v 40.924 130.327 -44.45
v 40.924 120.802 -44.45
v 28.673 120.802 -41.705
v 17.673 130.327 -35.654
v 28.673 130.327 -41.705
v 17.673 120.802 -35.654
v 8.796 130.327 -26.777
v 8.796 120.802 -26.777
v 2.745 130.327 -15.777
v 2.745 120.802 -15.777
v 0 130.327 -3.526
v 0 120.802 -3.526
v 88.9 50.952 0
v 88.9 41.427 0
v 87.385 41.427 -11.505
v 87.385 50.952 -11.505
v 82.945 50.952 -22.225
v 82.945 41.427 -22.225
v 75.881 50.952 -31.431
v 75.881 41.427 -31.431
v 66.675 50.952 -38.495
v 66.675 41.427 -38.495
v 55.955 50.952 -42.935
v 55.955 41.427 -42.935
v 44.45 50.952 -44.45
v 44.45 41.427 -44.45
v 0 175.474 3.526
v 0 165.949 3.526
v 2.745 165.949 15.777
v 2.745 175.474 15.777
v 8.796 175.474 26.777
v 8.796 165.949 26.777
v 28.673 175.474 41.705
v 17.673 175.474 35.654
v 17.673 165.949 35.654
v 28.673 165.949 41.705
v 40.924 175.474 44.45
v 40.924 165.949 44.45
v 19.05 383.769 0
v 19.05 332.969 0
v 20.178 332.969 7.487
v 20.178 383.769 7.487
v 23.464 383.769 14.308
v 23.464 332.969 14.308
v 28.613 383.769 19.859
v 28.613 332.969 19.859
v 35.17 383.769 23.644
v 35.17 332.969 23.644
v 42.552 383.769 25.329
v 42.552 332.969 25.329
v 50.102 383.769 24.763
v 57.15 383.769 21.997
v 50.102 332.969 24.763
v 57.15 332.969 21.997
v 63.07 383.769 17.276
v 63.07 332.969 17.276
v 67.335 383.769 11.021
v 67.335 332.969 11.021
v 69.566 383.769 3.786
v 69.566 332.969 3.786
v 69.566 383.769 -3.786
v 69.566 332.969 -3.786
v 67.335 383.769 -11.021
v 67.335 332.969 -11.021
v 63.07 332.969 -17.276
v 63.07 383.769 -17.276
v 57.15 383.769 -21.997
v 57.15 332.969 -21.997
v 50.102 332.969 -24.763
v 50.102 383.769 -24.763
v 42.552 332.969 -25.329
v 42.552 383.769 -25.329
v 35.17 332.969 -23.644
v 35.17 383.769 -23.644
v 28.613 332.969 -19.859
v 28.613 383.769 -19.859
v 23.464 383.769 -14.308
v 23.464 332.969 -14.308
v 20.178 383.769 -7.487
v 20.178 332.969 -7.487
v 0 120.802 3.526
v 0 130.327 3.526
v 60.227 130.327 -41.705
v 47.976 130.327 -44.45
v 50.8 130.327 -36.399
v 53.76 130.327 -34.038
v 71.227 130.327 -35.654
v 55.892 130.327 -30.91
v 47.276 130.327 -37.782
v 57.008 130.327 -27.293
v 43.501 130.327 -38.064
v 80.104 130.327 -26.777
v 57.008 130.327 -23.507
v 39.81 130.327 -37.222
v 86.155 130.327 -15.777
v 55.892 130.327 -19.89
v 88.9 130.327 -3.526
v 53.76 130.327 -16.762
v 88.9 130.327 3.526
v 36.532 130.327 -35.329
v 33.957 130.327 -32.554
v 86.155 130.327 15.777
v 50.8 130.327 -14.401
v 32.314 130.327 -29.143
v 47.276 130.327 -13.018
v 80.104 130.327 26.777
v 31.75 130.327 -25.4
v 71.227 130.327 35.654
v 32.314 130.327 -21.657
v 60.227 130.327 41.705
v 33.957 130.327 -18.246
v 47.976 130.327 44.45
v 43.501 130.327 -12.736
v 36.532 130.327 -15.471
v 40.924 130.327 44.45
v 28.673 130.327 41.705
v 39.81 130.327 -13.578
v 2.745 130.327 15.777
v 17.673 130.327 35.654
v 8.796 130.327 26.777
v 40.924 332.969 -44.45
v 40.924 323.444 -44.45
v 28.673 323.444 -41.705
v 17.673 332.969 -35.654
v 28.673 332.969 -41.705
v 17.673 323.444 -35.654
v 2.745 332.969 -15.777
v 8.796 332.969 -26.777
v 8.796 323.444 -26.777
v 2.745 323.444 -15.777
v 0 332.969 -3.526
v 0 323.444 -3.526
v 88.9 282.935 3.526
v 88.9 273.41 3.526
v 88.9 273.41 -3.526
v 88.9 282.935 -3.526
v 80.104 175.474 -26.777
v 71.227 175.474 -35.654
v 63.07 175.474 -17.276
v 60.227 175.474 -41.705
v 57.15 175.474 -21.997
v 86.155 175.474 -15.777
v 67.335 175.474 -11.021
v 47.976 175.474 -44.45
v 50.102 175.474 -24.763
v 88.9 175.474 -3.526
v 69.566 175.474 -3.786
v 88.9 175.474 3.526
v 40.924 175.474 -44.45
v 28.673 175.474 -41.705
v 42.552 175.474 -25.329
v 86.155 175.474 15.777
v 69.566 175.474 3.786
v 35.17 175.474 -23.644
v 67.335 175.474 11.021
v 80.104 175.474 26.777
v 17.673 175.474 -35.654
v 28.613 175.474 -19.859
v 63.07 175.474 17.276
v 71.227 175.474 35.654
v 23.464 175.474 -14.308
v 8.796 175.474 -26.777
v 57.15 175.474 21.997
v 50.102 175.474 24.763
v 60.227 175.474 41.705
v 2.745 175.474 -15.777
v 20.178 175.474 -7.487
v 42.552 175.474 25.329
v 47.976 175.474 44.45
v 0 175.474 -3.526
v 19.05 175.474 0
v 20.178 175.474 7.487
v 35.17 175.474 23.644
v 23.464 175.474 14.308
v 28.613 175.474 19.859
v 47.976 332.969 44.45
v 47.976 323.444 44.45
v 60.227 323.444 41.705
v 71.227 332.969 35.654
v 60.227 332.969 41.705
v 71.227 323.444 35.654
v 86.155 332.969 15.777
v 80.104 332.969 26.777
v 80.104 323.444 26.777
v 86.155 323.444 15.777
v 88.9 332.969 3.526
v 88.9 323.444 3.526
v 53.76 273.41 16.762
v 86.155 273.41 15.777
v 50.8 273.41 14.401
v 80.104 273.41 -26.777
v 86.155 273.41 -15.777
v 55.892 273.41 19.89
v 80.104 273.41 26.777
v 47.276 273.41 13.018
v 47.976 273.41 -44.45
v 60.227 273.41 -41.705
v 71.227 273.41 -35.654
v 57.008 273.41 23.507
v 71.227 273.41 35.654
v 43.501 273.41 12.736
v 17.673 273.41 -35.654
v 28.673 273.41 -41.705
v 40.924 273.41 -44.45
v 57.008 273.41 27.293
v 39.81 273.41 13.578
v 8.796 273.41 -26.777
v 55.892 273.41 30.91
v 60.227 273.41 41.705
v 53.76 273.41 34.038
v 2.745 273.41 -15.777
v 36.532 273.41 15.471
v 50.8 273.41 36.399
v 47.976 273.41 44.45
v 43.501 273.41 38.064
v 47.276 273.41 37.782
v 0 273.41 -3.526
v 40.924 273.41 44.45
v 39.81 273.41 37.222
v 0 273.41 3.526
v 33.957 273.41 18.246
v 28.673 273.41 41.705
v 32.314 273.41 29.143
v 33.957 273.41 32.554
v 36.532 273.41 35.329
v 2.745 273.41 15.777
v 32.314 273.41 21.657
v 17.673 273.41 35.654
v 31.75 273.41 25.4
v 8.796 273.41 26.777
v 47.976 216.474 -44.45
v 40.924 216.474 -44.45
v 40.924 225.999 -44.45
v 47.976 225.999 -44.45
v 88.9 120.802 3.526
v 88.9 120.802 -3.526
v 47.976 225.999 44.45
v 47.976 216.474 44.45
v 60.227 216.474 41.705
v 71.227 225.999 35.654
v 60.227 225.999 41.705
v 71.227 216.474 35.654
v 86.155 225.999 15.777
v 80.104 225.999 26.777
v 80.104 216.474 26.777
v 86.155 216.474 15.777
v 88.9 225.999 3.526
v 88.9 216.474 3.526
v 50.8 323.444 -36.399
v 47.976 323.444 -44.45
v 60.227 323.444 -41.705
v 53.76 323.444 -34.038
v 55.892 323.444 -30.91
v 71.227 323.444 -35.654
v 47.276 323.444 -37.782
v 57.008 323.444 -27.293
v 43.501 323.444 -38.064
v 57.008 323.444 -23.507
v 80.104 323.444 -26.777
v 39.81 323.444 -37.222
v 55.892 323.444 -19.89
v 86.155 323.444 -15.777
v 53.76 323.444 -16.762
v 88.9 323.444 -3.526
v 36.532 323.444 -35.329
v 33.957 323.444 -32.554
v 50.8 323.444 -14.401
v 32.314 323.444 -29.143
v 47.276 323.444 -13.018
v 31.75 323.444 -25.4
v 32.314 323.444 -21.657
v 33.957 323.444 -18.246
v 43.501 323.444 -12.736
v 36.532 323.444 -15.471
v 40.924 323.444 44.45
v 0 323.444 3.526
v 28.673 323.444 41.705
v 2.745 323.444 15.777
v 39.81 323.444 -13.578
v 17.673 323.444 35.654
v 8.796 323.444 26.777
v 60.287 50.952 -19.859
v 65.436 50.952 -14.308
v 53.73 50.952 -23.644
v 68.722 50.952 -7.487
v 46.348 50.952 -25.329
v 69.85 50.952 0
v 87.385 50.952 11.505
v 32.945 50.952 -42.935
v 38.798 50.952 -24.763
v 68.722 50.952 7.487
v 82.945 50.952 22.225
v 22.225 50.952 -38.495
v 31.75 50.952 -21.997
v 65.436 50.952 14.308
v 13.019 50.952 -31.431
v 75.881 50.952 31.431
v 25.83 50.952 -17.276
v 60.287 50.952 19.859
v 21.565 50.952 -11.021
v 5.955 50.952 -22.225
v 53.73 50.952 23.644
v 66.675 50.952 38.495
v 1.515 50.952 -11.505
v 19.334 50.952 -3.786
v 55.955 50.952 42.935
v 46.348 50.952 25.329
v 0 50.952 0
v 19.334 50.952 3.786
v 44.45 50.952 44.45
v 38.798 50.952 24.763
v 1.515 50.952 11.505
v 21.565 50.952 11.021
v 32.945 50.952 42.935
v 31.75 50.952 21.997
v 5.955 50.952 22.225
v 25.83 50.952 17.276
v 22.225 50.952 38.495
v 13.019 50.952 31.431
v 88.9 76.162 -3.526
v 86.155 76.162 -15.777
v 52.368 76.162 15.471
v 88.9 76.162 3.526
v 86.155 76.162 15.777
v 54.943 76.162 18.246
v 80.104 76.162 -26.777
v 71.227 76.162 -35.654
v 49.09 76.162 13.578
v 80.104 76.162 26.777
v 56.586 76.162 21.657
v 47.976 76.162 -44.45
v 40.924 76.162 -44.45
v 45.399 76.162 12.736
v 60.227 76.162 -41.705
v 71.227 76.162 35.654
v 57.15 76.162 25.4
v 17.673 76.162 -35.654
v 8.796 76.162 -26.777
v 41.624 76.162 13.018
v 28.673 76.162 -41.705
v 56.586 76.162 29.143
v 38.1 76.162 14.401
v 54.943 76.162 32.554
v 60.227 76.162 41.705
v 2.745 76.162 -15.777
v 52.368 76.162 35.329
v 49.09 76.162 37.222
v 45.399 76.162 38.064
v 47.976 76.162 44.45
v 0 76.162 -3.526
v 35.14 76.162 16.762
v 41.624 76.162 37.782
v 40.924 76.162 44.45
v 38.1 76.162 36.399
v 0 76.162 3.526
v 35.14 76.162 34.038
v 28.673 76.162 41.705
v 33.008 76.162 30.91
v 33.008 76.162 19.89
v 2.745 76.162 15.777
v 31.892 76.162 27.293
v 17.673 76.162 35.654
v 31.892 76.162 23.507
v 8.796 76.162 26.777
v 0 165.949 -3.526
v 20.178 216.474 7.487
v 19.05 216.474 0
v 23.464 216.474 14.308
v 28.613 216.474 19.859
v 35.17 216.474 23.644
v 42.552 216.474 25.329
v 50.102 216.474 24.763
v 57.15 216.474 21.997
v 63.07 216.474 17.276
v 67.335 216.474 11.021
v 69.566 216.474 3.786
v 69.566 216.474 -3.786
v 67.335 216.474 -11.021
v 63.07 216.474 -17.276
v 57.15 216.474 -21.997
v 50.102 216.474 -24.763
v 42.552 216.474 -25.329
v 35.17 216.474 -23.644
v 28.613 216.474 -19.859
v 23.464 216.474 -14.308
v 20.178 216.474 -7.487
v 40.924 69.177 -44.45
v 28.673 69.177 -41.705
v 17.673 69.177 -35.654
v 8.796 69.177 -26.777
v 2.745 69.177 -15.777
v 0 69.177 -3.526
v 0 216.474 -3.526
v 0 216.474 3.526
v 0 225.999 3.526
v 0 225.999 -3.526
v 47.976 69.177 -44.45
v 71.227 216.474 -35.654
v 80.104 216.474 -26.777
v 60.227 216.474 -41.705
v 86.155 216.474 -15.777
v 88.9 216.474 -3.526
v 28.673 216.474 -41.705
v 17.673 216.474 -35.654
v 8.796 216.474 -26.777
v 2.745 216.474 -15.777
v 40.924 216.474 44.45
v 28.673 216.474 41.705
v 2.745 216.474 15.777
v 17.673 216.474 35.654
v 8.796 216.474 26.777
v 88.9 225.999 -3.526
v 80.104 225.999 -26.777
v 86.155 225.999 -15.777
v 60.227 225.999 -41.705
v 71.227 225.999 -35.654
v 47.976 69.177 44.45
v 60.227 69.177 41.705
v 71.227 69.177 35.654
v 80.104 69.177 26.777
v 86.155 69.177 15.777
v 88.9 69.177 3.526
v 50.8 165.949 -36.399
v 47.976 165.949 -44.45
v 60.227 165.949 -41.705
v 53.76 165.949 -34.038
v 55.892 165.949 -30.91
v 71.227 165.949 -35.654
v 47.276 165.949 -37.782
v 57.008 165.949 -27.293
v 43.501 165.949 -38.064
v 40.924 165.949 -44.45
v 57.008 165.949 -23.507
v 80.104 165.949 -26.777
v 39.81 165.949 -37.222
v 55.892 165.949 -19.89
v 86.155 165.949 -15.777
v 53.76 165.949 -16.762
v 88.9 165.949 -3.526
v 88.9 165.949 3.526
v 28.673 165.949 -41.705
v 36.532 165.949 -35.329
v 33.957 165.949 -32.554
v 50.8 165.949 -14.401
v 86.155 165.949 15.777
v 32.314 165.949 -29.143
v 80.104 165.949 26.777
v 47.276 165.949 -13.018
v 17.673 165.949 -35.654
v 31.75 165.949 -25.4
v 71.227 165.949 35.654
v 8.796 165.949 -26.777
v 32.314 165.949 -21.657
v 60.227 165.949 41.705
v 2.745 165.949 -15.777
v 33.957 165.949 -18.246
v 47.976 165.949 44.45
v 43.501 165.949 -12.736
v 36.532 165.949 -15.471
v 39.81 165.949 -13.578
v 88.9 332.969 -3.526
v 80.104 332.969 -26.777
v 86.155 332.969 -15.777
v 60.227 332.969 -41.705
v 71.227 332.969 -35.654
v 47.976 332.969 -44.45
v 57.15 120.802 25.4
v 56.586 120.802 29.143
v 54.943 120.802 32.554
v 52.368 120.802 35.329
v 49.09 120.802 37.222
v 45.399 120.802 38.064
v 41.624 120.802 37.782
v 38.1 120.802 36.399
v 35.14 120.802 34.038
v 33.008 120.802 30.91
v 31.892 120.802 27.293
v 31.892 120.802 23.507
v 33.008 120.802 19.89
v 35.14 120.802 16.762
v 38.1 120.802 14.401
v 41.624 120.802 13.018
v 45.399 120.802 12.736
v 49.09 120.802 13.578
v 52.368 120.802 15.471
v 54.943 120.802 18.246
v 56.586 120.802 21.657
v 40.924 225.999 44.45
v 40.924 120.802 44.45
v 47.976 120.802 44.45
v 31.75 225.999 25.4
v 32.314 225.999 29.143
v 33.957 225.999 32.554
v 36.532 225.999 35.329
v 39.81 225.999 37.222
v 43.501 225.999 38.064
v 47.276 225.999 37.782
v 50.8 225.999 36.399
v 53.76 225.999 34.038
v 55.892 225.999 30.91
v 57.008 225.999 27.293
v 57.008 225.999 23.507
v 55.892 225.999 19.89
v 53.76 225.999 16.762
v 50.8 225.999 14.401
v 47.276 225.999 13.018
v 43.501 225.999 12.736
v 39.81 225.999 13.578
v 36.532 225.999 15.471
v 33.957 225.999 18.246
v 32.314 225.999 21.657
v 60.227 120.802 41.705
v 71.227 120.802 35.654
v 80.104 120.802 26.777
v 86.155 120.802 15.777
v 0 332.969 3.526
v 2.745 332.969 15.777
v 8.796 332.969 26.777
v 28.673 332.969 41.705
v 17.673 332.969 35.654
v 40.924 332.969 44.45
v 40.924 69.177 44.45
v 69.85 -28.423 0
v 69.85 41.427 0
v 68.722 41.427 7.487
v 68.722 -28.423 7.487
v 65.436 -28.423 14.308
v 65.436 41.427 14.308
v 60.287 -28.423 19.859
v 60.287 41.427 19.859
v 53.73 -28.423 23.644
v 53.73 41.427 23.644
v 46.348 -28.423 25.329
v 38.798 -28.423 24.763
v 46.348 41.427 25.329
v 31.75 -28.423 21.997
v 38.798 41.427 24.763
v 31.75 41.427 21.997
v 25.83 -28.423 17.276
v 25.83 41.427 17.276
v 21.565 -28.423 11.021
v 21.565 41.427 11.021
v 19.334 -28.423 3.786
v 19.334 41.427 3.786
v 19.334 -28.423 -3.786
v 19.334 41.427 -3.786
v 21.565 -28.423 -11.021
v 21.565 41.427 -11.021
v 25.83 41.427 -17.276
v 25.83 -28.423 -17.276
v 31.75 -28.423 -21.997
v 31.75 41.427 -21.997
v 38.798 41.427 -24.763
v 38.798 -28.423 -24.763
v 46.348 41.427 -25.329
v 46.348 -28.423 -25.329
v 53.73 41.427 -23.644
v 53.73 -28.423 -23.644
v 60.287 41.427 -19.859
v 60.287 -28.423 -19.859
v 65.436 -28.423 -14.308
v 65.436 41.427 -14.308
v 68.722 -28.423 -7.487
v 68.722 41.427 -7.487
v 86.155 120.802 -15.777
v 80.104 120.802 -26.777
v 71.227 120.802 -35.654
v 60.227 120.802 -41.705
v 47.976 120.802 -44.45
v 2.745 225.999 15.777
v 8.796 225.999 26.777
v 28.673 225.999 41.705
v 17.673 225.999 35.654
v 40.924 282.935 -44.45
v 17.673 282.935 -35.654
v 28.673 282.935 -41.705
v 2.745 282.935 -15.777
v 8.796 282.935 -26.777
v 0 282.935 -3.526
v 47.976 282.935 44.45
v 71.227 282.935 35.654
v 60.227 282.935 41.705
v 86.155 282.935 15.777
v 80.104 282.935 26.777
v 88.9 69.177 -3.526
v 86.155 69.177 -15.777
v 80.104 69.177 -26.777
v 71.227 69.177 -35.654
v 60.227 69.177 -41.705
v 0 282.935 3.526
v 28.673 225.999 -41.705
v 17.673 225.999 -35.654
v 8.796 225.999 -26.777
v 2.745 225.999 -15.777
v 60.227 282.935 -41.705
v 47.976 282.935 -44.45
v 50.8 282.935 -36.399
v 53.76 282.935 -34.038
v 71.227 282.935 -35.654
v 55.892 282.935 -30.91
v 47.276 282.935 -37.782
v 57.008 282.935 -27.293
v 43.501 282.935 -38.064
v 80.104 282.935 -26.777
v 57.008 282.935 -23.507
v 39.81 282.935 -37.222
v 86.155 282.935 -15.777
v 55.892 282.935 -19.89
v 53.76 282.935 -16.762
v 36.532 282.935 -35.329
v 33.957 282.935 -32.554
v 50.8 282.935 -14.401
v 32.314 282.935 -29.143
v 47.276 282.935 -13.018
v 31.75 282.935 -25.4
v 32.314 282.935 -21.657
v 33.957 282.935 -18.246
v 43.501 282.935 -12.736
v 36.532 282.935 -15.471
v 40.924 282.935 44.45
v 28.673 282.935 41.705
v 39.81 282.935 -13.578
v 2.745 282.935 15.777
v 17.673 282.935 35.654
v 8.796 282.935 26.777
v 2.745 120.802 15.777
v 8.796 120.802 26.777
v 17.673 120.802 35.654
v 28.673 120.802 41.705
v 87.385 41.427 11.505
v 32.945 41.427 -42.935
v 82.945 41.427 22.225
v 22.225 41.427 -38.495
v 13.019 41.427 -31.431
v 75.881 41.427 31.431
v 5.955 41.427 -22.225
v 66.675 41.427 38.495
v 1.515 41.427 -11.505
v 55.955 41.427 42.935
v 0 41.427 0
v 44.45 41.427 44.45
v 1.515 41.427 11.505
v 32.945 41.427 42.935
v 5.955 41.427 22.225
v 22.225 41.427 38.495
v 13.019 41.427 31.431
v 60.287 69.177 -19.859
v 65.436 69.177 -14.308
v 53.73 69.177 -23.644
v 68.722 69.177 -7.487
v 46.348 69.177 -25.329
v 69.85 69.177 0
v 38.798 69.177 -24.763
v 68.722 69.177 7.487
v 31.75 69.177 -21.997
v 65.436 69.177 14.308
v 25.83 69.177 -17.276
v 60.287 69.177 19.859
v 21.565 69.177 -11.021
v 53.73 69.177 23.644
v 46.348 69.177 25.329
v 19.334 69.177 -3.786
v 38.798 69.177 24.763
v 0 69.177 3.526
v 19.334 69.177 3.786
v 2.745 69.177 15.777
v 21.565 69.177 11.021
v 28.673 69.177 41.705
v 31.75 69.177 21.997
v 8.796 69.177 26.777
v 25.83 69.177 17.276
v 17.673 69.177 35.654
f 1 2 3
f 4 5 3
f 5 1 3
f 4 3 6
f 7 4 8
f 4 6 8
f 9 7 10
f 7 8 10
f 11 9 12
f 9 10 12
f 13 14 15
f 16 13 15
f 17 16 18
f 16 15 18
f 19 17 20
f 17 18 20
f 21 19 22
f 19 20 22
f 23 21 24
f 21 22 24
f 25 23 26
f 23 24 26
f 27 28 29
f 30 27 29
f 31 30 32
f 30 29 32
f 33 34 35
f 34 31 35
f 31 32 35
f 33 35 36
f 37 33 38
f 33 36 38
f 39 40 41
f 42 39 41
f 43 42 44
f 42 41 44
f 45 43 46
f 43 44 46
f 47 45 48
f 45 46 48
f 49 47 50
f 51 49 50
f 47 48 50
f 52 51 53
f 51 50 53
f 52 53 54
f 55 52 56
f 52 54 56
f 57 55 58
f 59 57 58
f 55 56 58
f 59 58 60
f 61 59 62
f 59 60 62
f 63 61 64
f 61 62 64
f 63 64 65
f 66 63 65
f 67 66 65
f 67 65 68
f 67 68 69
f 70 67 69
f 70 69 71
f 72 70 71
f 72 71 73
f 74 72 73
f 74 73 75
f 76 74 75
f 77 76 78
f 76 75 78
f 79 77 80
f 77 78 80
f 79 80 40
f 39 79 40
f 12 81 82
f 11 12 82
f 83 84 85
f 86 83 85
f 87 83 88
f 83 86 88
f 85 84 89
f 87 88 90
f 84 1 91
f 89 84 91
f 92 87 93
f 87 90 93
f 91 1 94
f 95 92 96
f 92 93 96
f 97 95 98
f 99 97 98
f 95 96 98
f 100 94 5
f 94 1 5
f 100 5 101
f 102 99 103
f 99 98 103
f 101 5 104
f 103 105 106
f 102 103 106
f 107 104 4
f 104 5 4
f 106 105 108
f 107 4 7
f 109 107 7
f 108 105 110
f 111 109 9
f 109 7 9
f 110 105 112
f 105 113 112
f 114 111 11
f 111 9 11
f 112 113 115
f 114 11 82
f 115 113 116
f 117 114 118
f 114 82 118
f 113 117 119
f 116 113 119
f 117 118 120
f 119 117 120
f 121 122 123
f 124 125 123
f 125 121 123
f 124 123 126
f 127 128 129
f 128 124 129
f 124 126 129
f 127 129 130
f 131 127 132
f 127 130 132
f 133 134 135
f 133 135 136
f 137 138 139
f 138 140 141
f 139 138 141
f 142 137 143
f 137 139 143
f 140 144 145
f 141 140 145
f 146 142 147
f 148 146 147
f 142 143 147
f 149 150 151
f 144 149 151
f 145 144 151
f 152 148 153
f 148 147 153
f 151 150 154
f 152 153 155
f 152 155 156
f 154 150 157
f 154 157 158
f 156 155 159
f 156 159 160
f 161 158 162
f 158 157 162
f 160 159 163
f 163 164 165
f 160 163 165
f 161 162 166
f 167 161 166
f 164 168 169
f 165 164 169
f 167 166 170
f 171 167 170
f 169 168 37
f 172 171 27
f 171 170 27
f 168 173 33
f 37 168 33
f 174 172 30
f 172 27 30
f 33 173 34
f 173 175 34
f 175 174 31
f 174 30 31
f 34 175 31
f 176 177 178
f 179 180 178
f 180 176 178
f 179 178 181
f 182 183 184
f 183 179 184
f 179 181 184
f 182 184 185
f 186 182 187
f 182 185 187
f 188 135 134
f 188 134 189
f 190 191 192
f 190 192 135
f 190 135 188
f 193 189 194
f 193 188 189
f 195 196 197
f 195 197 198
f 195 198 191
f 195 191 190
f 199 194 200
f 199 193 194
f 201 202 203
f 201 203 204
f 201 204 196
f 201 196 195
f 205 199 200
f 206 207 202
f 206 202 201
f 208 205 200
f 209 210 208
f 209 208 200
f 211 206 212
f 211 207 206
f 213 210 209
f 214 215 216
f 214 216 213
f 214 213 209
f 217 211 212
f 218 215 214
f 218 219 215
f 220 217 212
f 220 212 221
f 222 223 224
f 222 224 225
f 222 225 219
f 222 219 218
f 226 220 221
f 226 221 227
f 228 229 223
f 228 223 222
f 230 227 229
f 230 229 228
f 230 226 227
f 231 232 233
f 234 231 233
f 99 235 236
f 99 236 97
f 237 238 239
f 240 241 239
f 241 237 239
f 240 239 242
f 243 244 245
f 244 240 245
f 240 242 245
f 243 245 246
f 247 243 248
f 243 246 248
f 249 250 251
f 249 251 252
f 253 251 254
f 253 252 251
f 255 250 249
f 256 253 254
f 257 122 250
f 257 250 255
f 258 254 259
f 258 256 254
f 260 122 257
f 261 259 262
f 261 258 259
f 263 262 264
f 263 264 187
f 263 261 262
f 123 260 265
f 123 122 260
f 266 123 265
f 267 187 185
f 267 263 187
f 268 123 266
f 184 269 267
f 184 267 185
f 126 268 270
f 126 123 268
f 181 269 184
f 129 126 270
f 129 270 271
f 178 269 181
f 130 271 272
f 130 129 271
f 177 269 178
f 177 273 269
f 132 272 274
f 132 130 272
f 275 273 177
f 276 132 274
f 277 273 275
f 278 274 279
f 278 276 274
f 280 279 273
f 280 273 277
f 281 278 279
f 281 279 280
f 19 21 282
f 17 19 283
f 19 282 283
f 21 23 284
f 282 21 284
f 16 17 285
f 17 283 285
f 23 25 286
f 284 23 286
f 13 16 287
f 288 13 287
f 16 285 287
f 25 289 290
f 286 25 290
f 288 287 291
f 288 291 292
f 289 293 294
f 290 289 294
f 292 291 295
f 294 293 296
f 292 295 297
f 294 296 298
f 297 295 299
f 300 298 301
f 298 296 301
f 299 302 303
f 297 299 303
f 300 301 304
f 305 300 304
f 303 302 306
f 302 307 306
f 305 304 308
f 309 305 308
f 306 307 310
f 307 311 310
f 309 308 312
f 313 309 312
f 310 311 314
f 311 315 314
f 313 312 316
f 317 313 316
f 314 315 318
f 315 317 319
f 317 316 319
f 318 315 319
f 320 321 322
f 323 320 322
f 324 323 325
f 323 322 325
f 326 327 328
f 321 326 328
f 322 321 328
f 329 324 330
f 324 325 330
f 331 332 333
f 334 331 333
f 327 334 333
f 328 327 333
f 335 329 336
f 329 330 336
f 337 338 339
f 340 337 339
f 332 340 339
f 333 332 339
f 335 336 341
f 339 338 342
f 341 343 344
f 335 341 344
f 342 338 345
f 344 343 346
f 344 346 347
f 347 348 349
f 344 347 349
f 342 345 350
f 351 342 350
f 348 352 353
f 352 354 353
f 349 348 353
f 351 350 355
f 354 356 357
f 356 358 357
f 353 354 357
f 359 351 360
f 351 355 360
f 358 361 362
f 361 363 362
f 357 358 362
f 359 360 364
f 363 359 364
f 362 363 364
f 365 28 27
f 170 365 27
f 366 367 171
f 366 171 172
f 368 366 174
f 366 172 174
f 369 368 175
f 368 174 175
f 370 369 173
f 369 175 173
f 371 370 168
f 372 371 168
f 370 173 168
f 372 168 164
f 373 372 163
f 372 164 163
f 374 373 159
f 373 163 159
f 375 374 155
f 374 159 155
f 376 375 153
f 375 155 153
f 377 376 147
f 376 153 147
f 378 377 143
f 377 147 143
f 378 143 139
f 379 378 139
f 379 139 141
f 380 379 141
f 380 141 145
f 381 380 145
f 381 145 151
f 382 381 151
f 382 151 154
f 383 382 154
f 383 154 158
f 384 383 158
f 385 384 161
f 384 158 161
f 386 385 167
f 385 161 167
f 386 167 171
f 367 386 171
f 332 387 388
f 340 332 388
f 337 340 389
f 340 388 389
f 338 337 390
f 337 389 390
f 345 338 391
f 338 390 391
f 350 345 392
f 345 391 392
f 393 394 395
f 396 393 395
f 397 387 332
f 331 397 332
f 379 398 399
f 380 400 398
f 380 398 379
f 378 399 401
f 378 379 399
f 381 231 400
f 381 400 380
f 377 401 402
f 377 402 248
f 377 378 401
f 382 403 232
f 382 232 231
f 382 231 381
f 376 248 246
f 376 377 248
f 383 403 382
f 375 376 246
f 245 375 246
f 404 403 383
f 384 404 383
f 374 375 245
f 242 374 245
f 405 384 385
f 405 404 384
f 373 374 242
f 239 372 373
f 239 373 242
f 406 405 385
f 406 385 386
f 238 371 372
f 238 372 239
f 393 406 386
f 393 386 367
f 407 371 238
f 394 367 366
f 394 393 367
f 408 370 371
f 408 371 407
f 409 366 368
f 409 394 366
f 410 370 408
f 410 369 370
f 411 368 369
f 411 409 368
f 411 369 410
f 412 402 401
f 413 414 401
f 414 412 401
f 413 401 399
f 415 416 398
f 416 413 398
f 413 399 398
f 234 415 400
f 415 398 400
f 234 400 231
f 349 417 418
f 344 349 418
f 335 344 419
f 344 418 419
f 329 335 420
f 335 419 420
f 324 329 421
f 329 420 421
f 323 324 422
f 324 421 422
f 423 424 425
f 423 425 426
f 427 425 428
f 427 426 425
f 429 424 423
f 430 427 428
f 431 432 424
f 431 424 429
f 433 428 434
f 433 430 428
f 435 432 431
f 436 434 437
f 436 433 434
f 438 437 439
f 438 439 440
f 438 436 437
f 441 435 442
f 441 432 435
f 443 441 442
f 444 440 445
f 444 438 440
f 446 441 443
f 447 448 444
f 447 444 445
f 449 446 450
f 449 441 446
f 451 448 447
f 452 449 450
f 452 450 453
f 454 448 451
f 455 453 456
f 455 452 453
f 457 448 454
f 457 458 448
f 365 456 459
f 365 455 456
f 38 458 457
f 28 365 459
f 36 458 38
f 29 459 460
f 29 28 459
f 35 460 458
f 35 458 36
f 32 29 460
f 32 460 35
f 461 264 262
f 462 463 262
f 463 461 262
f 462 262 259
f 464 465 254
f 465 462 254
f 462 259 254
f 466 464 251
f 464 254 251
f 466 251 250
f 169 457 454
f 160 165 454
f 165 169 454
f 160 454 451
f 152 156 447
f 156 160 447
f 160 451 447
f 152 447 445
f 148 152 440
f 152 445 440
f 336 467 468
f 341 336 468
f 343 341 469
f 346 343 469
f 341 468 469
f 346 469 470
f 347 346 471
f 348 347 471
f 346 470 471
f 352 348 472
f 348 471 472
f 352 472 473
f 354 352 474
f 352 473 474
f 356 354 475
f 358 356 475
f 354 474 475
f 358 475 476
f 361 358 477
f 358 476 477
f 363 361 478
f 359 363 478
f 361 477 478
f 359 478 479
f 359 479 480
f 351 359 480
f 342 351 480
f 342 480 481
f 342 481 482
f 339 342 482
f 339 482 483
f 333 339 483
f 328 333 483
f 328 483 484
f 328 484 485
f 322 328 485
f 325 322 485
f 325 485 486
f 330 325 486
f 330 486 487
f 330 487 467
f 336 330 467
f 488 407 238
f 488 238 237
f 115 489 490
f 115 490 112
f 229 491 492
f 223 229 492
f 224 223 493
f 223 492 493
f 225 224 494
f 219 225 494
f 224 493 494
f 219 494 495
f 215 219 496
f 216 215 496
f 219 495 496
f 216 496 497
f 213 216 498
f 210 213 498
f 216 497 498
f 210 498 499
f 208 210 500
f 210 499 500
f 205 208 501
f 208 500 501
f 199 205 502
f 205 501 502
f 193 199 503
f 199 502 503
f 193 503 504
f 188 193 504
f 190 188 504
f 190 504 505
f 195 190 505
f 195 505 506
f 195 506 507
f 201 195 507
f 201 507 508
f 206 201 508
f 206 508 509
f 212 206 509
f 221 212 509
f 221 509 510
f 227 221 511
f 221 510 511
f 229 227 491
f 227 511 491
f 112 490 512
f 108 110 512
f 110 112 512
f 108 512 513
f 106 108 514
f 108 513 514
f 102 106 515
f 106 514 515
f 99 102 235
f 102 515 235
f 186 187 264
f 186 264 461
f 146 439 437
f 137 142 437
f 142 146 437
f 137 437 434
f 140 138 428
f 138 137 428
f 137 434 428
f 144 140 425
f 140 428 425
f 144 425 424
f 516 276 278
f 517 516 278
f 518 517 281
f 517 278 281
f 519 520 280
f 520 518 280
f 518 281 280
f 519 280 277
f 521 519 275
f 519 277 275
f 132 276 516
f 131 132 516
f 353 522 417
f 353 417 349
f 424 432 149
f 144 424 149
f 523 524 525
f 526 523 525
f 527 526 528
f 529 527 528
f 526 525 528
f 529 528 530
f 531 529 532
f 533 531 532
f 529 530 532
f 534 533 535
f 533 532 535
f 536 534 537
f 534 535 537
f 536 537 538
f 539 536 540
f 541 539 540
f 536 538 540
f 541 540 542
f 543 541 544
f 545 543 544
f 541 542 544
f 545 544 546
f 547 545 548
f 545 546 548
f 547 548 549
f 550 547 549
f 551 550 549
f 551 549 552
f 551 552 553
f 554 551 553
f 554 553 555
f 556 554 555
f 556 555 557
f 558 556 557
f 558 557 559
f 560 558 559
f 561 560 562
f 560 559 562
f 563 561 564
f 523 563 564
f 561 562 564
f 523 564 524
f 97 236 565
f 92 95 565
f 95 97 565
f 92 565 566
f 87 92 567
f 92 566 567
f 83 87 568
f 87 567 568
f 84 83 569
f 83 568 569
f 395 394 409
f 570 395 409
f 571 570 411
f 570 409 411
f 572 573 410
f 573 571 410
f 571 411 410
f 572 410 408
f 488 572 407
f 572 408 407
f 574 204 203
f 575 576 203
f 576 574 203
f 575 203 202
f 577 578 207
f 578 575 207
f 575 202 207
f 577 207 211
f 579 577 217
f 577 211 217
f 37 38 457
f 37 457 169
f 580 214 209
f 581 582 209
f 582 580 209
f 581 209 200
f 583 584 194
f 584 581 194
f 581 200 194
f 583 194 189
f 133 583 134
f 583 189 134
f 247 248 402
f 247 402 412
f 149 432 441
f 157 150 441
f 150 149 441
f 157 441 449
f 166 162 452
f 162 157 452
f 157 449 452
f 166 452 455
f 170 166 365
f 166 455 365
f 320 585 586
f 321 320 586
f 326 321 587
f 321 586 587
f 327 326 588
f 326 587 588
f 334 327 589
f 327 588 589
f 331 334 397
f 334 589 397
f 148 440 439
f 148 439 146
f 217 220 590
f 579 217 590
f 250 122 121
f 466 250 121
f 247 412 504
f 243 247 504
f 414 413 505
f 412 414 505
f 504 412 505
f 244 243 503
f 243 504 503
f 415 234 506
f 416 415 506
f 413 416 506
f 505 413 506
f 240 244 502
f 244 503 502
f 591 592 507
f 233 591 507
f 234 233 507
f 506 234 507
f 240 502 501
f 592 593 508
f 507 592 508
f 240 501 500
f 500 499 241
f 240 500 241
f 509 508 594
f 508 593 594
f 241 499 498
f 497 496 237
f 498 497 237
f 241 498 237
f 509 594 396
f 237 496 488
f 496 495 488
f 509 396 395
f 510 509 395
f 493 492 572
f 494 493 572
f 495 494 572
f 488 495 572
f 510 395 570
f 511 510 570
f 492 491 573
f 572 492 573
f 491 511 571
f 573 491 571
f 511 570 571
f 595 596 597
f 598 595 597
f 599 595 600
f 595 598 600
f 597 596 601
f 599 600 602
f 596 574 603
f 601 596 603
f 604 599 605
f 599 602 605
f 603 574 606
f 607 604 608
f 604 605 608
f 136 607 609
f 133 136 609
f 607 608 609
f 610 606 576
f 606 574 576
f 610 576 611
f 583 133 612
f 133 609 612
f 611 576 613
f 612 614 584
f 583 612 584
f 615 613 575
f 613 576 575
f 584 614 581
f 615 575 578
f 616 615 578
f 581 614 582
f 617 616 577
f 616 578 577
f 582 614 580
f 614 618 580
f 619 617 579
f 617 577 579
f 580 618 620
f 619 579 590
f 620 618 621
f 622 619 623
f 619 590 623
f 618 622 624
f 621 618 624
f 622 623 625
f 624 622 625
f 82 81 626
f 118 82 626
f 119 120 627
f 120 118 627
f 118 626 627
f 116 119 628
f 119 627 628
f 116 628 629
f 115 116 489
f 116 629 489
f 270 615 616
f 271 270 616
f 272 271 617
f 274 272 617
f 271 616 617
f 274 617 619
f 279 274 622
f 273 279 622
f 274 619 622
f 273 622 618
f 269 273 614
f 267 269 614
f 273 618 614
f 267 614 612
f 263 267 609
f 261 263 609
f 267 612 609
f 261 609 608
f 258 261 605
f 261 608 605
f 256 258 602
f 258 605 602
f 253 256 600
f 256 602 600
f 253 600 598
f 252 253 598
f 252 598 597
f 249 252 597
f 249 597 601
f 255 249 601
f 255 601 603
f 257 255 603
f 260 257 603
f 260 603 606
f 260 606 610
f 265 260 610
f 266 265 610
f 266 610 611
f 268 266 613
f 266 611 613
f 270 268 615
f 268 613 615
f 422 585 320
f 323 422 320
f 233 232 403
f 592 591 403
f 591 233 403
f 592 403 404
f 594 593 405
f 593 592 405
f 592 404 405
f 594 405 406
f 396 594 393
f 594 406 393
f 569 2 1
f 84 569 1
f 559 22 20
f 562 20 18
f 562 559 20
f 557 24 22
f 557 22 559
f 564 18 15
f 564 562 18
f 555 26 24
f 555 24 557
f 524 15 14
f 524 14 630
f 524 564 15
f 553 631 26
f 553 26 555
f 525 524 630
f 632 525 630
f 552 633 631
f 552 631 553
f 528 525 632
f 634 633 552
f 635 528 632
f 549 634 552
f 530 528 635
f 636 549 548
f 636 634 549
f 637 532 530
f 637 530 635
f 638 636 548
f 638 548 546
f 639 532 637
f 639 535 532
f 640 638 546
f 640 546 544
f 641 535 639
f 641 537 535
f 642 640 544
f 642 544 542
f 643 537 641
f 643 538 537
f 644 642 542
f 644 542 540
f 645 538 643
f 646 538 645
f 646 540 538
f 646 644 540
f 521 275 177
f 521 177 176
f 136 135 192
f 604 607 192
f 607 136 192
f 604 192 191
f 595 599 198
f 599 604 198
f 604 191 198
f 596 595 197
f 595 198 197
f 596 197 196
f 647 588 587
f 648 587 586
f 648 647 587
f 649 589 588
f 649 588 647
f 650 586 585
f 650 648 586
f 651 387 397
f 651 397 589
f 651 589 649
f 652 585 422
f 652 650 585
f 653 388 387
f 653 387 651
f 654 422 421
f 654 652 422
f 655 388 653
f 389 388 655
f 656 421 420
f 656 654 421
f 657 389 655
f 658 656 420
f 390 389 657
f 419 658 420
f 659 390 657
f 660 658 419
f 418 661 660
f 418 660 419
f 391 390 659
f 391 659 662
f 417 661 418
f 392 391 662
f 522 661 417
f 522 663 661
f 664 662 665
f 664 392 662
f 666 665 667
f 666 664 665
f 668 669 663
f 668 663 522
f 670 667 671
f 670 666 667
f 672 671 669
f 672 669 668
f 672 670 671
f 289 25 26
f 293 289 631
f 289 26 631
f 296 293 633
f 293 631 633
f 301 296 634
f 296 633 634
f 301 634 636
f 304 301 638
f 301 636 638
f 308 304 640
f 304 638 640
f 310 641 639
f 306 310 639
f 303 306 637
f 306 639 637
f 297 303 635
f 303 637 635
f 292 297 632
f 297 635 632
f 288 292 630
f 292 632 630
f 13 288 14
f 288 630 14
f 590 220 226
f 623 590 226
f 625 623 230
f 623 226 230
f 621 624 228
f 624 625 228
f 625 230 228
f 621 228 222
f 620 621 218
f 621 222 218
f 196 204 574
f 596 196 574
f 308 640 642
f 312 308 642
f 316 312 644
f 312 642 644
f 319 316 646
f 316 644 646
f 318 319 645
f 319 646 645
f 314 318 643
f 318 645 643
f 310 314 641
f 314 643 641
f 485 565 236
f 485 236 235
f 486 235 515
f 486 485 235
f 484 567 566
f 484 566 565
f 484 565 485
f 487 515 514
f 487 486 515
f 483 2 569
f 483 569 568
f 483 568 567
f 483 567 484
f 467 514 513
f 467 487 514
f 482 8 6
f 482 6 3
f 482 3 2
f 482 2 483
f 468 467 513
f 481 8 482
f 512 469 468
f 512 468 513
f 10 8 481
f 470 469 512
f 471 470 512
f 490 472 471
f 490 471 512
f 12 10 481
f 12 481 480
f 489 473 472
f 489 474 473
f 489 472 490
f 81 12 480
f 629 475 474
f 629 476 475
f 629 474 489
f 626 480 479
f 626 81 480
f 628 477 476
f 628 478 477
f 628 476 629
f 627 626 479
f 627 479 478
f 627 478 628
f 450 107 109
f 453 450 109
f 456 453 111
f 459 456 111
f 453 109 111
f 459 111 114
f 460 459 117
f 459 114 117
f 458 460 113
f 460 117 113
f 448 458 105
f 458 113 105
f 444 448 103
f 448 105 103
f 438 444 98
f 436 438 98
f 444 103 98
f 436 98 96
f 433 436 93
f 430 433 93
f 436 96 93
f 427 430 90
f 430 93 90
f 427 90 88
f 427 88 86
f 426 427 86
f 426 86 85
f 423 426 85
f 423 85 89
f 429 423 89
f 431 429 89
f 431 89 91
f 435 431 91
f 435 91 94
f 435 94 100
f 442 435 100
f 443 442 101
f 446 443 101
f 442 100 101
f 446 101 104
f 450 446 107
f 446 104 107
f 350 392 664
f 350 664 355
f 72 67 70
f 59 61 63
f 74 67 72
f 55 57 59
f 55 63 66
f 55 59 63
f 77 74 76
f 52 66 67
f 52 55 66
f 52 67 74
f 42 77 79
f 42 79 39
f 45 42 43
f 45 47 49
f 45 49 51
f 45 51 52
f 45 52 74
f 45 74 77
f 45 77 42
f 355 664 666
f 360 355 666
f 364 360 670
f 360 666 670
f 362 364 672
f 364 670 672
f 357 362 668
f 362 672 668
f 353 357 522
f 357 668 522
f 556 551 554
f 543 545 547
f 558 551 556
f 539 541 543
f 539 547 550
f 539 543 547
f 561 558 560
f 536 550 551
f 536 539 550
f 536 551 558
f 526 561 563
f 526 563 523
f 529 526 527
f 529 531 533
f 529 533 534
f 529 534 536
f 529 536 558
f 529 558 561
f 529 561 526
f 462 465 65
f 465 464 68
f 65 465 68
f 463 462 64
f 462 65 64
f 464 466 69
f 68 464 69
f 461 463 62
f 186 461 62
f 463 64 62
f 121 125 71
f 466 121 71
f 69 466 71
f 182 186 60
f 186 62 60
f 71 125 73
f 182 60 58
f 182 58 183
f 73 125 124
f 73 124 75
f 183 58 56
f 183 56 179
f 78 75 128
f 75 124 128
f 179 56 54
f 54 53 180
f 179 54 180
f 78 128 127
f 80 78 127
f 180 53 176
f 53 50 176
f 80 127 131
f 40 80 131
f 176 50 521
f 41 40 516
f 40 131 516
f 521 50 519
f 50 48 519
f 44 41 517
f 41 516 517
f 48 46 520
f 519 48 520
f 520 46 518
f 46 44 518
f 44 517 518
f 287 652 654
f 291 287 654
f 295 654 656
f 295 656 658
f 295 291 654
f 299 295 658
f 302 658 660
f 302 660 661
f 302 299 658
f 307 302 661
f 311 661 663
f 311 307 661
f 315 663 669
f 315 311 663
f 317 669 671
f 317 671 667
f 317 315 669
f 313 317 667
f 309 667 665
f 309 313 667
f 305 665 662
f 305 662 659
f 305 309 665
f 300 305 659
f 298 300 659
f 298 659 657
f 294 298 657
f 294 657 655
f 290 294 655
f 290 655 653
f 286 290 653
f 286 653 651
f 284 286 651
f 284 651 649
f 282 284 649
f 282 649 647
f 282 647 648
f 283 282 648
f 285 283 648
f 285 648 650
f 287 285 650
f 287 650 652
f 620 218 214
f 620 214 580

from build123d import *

# Parameters (mm, degrees)
F0_W          = 9.525
F0_H          = 88.9
F1_DEPTH      = 88.9
F2_R          = 25.4
F3_DEPTH      = 69.85
F3_DEPTH_BACK = 30.734
F4_DEPTH      = 12.192
F5_R          = 12.7
F6_DEPTH      = 42.1005
F7_R          = 12.7
F8_DEPTH      = 35.6218531678
F9_R          = 25.4
F10_DEPTH     = 40.9996094773
F11_R         = 12.7
F12_DEPTH     = 47.4110707312
F13_R         = 12.7
F14_DEPTH     = 40.5094634056
F16_DEPTH     = 263.7934967819
F17_R         = 25.4
F18_DEPTH     = 50.8
F19_DEPTH     = 2.54


with BuildPart() as f1:
    # F0 (on Right) → F1 (new body)
    with BuildSketch(Plane.YZ):
        with Locations((46.1899, 0)):
            Rectangle(F0_W, F0_H)
    extrude(amount=F1_DEPTH)



with BuildPart() as f1b:
    # F0 (on Right) → F1, piece 2 (new body)
    with BuildSketch(Plane.YZ):
        with Locations((73.9394, 0)):
            Rectangle(F0_W, F0_H)
    extrude(amount=F1_DEPTH)


with BuildPart() as f1c:
    # F0 (on Right) → F1, piece 3 (new body)
    with BuildSketch(Plane.YZ):
        with Locations((125.5649, 0)):
            Rectangle(F0_W, F0_H)
    extrude(amount=F1_DEPTH)


with BuildPart() as f1d:
    # F0 (on Right) → F1, piece 4 (new body)
    with BuildSketch(Plane.YZ):
        with Locations((170.7117531678, 0)):
            Rectangle(F0_W, F0_H)
    extrude(amount=F1_DEPTH)


with BuildPart() as f1e:
    # F0 (on Right) → F1, piece 5 (new body)
    with BuildSketch(Plane.YZ):
        with Locations((221.2363626451, 0)):
            Rectangle(F0_W, F0_H)
    extrude(amount=F1_DEPTH)


with BuildPart() as f1f:
    # F0 (on Right) → F1, piece 6 (new body)
    with BuildSketch(Plane.YZ):
        with Locations((278.1724333763, 0)):
            Rectangle(F0_W, F0_H)
    extrude(amount=F1_DEPTH)


with BuildPart() as f1g:
    # F0 (on Right) → F1, piece 7 (new body)
    with BuildSketch(Plane.YZ):
        with Locations((328.2068967819, 0)):
            Rectangle(F0_W, F0_H)
    extrude(amount=F1_DEPTH)


with BuildPart() as f1_1:
    add(f1.part)

    add(f1b.part)  # F3 merges F1b
    # F2 (on face) → F3 (join, two sides)
    with BuildSketch(Plane.XZ.offset(-41.4274)) as f3_sk:
        with Locations((44.45, 0)):
            Circle(F2_R)
    extrude(amount=F3_DEPTH)
    extrude(f3_sk.sketch, amount=-F3_DEPTH_BACK)

    # F2 (on face) → F4 (cut)
    with BuildSketch(Plane.XZ.offset(-41.4274)):
        with BuildLine():
            ThreePointArc((44.45, 44.45), (75.8808964237, 31.4308964237), (88.9, 0))
            Line((88.9, 0), (88.9, 44.45))
            Line((88.9, 44.45), (44.45, 44.45))
        make_face()
        with BuildLine():
            ThreePointArc((0, -1.192e-07), (13.0191035341, 31.4308963816), (44.45, 44.45))
            Line((44.45, 44.45), (0, 44.45))
            Line((0, 44.45), (0, -1.192e-07))
        make_face()
        with BuildLine():
            Line((0, -44.45), (44.45, -44.45))
            ThreePointArc((44.45, -44.45), (13.0191036184, -31.4308964659), (0, -1.192e-07))
            Line((0, -1.192e-07), (0, -44.45))
        make_face()
        with BuildLine():
            Line((88.9, -44.45), (88.9, 0))
            ThreePointArc((88.9, 0), (75.8808964237, -31.4308964237), (44.45, -44.45))
            Line((44.45, -44.45), (88.9, -44.45))
        make_face()
    extrude(amount=-F4_DEPTH, mode=Mode.SUBTRACT)


    add(f1c.part)  # F6 merges F1c
    # F5 (on face) → F6 (join, through all)
    with BuildSketch(Plane.XZ.offset(-120.8024)):
        with Locations((44.45, 25.4)):
            Circle(F5_R)
    extrude(amount=F6_DEPTH)


    add(f1d.part)  # F8 merges F1d
    # F7 (on face) → F8 (join, through all)
    with BuildSketch(Plane(origin=(0, 130.3274, 0), x_dir=(-1, 0, 0), z_dir=(0, 1, 0))):
        with Locations((-44.45, -25.4)):
            Circle(F7_R)
    extrude(amount=F8_DEPTH)


    add(f1e.part)  # F10 merges F1e
    # F9 (on face) → F10 (join, through all)
    with BuildSketch(Plane(origin=(0, 175.4742531678, 0), x_dir=(-1, 0, 0), z_dir=(0, 1, 0))):
        with Locations((-44.45, 0)):
            Circle(F9_R)
    extrude(amount=F10_DEPTH)


    add(f1f.part)  # F12 merges F1f
    # F11 (on face) → F12 (join, through all)
    with BuildSketch(Plane(origin=(0, 225.9988626451, 0), x_dir=(-1, 0, 0), z_dir=(0, 1, 0))):
        with Locations((-44.45, 25.4)):
            Circle(F11_R)
    extrude(amount=F12_DEPTH)


    add(f1g.part)  # F14 merges F1g
    # F13 (on face) → F14 (join, through all)
    with BuildSketch(Plane(origin=(0, 282.9349333763, 0), x_dir=(-1, 0, 0), z_dir=(0, 1, 0))):
        with Locations((-44.45, -25.4)):
            Circle(F13_R)
    extrude(amount=F14_DEPTH)

    # F15 (on face) → F16 (cut, through all)
    with BuildSketch(Plane.XZ.offset(-69.1769)):
        with BuildLine():
            ThreePointArc((0, 3.5263449072), (12.9203503952, 31.5296496048), (40.9236550928, 44.45))
            Line((40.9236550928, 44.45), (0, 44.45))
            Line((0, 44.45), (0, 3.5263449072))
        make_face()
        with BuildLine():
            Line((0, -44.45), (40.9236550928, -44.45))
            ThreePointArc((40.9236550928, -44.45), (12.9203503952, -31.5296496048), (0, -3.5263449072))
            Line((0, -3.5263449072), (0, -44.45))
        make_face()
        with BuildLine():
            Line((88.9, -44.45), (88.9, -3.5263449072))
            ThreePointArc((88.9, -3.5263449072), (75.9796496048, -31.5296496048), (47.9763449072, -44.45))
            Line((47.9763449072, -44.45), (88.9, -44.45))
        make_face()
        with BuildLine():
            ThreePointArc((47.9763449072, 44.45), (75.9796496048, 31.5296496048), (88.9, 3.5263449072))
            Line((88.9, 3.5263449072), (88.9, 44.45))
            Line((88.9, 44.45), (47.9763449072, 44.45))
        make_face()
    extrude(amount=-F16_DEPTH, mode=Mode.SUBTRACT)

    # F17 (on face) → F18 (join)
    with BuildSketch(Plane(origin=(0, 332.9693967819, 0), x_dir=(-1, 0, 0), z_dir=(0, 1, 0))):
        with Locations((-44.45, 0)):
            Circle(F17_R)
    extrude(amount=F18_DEPTH)

    # F19 (cut): a face of the model
    f19_faces = [f1_1.faces().sort_by_distance(p)[0] for p in [
        (44.45, 78.7019, -2.2434372105),
    ]]
    extrude(f19_faces, amount=-F19_DEPTH, mode=Mode.SUBTRACT)


solid = f1_1.part
